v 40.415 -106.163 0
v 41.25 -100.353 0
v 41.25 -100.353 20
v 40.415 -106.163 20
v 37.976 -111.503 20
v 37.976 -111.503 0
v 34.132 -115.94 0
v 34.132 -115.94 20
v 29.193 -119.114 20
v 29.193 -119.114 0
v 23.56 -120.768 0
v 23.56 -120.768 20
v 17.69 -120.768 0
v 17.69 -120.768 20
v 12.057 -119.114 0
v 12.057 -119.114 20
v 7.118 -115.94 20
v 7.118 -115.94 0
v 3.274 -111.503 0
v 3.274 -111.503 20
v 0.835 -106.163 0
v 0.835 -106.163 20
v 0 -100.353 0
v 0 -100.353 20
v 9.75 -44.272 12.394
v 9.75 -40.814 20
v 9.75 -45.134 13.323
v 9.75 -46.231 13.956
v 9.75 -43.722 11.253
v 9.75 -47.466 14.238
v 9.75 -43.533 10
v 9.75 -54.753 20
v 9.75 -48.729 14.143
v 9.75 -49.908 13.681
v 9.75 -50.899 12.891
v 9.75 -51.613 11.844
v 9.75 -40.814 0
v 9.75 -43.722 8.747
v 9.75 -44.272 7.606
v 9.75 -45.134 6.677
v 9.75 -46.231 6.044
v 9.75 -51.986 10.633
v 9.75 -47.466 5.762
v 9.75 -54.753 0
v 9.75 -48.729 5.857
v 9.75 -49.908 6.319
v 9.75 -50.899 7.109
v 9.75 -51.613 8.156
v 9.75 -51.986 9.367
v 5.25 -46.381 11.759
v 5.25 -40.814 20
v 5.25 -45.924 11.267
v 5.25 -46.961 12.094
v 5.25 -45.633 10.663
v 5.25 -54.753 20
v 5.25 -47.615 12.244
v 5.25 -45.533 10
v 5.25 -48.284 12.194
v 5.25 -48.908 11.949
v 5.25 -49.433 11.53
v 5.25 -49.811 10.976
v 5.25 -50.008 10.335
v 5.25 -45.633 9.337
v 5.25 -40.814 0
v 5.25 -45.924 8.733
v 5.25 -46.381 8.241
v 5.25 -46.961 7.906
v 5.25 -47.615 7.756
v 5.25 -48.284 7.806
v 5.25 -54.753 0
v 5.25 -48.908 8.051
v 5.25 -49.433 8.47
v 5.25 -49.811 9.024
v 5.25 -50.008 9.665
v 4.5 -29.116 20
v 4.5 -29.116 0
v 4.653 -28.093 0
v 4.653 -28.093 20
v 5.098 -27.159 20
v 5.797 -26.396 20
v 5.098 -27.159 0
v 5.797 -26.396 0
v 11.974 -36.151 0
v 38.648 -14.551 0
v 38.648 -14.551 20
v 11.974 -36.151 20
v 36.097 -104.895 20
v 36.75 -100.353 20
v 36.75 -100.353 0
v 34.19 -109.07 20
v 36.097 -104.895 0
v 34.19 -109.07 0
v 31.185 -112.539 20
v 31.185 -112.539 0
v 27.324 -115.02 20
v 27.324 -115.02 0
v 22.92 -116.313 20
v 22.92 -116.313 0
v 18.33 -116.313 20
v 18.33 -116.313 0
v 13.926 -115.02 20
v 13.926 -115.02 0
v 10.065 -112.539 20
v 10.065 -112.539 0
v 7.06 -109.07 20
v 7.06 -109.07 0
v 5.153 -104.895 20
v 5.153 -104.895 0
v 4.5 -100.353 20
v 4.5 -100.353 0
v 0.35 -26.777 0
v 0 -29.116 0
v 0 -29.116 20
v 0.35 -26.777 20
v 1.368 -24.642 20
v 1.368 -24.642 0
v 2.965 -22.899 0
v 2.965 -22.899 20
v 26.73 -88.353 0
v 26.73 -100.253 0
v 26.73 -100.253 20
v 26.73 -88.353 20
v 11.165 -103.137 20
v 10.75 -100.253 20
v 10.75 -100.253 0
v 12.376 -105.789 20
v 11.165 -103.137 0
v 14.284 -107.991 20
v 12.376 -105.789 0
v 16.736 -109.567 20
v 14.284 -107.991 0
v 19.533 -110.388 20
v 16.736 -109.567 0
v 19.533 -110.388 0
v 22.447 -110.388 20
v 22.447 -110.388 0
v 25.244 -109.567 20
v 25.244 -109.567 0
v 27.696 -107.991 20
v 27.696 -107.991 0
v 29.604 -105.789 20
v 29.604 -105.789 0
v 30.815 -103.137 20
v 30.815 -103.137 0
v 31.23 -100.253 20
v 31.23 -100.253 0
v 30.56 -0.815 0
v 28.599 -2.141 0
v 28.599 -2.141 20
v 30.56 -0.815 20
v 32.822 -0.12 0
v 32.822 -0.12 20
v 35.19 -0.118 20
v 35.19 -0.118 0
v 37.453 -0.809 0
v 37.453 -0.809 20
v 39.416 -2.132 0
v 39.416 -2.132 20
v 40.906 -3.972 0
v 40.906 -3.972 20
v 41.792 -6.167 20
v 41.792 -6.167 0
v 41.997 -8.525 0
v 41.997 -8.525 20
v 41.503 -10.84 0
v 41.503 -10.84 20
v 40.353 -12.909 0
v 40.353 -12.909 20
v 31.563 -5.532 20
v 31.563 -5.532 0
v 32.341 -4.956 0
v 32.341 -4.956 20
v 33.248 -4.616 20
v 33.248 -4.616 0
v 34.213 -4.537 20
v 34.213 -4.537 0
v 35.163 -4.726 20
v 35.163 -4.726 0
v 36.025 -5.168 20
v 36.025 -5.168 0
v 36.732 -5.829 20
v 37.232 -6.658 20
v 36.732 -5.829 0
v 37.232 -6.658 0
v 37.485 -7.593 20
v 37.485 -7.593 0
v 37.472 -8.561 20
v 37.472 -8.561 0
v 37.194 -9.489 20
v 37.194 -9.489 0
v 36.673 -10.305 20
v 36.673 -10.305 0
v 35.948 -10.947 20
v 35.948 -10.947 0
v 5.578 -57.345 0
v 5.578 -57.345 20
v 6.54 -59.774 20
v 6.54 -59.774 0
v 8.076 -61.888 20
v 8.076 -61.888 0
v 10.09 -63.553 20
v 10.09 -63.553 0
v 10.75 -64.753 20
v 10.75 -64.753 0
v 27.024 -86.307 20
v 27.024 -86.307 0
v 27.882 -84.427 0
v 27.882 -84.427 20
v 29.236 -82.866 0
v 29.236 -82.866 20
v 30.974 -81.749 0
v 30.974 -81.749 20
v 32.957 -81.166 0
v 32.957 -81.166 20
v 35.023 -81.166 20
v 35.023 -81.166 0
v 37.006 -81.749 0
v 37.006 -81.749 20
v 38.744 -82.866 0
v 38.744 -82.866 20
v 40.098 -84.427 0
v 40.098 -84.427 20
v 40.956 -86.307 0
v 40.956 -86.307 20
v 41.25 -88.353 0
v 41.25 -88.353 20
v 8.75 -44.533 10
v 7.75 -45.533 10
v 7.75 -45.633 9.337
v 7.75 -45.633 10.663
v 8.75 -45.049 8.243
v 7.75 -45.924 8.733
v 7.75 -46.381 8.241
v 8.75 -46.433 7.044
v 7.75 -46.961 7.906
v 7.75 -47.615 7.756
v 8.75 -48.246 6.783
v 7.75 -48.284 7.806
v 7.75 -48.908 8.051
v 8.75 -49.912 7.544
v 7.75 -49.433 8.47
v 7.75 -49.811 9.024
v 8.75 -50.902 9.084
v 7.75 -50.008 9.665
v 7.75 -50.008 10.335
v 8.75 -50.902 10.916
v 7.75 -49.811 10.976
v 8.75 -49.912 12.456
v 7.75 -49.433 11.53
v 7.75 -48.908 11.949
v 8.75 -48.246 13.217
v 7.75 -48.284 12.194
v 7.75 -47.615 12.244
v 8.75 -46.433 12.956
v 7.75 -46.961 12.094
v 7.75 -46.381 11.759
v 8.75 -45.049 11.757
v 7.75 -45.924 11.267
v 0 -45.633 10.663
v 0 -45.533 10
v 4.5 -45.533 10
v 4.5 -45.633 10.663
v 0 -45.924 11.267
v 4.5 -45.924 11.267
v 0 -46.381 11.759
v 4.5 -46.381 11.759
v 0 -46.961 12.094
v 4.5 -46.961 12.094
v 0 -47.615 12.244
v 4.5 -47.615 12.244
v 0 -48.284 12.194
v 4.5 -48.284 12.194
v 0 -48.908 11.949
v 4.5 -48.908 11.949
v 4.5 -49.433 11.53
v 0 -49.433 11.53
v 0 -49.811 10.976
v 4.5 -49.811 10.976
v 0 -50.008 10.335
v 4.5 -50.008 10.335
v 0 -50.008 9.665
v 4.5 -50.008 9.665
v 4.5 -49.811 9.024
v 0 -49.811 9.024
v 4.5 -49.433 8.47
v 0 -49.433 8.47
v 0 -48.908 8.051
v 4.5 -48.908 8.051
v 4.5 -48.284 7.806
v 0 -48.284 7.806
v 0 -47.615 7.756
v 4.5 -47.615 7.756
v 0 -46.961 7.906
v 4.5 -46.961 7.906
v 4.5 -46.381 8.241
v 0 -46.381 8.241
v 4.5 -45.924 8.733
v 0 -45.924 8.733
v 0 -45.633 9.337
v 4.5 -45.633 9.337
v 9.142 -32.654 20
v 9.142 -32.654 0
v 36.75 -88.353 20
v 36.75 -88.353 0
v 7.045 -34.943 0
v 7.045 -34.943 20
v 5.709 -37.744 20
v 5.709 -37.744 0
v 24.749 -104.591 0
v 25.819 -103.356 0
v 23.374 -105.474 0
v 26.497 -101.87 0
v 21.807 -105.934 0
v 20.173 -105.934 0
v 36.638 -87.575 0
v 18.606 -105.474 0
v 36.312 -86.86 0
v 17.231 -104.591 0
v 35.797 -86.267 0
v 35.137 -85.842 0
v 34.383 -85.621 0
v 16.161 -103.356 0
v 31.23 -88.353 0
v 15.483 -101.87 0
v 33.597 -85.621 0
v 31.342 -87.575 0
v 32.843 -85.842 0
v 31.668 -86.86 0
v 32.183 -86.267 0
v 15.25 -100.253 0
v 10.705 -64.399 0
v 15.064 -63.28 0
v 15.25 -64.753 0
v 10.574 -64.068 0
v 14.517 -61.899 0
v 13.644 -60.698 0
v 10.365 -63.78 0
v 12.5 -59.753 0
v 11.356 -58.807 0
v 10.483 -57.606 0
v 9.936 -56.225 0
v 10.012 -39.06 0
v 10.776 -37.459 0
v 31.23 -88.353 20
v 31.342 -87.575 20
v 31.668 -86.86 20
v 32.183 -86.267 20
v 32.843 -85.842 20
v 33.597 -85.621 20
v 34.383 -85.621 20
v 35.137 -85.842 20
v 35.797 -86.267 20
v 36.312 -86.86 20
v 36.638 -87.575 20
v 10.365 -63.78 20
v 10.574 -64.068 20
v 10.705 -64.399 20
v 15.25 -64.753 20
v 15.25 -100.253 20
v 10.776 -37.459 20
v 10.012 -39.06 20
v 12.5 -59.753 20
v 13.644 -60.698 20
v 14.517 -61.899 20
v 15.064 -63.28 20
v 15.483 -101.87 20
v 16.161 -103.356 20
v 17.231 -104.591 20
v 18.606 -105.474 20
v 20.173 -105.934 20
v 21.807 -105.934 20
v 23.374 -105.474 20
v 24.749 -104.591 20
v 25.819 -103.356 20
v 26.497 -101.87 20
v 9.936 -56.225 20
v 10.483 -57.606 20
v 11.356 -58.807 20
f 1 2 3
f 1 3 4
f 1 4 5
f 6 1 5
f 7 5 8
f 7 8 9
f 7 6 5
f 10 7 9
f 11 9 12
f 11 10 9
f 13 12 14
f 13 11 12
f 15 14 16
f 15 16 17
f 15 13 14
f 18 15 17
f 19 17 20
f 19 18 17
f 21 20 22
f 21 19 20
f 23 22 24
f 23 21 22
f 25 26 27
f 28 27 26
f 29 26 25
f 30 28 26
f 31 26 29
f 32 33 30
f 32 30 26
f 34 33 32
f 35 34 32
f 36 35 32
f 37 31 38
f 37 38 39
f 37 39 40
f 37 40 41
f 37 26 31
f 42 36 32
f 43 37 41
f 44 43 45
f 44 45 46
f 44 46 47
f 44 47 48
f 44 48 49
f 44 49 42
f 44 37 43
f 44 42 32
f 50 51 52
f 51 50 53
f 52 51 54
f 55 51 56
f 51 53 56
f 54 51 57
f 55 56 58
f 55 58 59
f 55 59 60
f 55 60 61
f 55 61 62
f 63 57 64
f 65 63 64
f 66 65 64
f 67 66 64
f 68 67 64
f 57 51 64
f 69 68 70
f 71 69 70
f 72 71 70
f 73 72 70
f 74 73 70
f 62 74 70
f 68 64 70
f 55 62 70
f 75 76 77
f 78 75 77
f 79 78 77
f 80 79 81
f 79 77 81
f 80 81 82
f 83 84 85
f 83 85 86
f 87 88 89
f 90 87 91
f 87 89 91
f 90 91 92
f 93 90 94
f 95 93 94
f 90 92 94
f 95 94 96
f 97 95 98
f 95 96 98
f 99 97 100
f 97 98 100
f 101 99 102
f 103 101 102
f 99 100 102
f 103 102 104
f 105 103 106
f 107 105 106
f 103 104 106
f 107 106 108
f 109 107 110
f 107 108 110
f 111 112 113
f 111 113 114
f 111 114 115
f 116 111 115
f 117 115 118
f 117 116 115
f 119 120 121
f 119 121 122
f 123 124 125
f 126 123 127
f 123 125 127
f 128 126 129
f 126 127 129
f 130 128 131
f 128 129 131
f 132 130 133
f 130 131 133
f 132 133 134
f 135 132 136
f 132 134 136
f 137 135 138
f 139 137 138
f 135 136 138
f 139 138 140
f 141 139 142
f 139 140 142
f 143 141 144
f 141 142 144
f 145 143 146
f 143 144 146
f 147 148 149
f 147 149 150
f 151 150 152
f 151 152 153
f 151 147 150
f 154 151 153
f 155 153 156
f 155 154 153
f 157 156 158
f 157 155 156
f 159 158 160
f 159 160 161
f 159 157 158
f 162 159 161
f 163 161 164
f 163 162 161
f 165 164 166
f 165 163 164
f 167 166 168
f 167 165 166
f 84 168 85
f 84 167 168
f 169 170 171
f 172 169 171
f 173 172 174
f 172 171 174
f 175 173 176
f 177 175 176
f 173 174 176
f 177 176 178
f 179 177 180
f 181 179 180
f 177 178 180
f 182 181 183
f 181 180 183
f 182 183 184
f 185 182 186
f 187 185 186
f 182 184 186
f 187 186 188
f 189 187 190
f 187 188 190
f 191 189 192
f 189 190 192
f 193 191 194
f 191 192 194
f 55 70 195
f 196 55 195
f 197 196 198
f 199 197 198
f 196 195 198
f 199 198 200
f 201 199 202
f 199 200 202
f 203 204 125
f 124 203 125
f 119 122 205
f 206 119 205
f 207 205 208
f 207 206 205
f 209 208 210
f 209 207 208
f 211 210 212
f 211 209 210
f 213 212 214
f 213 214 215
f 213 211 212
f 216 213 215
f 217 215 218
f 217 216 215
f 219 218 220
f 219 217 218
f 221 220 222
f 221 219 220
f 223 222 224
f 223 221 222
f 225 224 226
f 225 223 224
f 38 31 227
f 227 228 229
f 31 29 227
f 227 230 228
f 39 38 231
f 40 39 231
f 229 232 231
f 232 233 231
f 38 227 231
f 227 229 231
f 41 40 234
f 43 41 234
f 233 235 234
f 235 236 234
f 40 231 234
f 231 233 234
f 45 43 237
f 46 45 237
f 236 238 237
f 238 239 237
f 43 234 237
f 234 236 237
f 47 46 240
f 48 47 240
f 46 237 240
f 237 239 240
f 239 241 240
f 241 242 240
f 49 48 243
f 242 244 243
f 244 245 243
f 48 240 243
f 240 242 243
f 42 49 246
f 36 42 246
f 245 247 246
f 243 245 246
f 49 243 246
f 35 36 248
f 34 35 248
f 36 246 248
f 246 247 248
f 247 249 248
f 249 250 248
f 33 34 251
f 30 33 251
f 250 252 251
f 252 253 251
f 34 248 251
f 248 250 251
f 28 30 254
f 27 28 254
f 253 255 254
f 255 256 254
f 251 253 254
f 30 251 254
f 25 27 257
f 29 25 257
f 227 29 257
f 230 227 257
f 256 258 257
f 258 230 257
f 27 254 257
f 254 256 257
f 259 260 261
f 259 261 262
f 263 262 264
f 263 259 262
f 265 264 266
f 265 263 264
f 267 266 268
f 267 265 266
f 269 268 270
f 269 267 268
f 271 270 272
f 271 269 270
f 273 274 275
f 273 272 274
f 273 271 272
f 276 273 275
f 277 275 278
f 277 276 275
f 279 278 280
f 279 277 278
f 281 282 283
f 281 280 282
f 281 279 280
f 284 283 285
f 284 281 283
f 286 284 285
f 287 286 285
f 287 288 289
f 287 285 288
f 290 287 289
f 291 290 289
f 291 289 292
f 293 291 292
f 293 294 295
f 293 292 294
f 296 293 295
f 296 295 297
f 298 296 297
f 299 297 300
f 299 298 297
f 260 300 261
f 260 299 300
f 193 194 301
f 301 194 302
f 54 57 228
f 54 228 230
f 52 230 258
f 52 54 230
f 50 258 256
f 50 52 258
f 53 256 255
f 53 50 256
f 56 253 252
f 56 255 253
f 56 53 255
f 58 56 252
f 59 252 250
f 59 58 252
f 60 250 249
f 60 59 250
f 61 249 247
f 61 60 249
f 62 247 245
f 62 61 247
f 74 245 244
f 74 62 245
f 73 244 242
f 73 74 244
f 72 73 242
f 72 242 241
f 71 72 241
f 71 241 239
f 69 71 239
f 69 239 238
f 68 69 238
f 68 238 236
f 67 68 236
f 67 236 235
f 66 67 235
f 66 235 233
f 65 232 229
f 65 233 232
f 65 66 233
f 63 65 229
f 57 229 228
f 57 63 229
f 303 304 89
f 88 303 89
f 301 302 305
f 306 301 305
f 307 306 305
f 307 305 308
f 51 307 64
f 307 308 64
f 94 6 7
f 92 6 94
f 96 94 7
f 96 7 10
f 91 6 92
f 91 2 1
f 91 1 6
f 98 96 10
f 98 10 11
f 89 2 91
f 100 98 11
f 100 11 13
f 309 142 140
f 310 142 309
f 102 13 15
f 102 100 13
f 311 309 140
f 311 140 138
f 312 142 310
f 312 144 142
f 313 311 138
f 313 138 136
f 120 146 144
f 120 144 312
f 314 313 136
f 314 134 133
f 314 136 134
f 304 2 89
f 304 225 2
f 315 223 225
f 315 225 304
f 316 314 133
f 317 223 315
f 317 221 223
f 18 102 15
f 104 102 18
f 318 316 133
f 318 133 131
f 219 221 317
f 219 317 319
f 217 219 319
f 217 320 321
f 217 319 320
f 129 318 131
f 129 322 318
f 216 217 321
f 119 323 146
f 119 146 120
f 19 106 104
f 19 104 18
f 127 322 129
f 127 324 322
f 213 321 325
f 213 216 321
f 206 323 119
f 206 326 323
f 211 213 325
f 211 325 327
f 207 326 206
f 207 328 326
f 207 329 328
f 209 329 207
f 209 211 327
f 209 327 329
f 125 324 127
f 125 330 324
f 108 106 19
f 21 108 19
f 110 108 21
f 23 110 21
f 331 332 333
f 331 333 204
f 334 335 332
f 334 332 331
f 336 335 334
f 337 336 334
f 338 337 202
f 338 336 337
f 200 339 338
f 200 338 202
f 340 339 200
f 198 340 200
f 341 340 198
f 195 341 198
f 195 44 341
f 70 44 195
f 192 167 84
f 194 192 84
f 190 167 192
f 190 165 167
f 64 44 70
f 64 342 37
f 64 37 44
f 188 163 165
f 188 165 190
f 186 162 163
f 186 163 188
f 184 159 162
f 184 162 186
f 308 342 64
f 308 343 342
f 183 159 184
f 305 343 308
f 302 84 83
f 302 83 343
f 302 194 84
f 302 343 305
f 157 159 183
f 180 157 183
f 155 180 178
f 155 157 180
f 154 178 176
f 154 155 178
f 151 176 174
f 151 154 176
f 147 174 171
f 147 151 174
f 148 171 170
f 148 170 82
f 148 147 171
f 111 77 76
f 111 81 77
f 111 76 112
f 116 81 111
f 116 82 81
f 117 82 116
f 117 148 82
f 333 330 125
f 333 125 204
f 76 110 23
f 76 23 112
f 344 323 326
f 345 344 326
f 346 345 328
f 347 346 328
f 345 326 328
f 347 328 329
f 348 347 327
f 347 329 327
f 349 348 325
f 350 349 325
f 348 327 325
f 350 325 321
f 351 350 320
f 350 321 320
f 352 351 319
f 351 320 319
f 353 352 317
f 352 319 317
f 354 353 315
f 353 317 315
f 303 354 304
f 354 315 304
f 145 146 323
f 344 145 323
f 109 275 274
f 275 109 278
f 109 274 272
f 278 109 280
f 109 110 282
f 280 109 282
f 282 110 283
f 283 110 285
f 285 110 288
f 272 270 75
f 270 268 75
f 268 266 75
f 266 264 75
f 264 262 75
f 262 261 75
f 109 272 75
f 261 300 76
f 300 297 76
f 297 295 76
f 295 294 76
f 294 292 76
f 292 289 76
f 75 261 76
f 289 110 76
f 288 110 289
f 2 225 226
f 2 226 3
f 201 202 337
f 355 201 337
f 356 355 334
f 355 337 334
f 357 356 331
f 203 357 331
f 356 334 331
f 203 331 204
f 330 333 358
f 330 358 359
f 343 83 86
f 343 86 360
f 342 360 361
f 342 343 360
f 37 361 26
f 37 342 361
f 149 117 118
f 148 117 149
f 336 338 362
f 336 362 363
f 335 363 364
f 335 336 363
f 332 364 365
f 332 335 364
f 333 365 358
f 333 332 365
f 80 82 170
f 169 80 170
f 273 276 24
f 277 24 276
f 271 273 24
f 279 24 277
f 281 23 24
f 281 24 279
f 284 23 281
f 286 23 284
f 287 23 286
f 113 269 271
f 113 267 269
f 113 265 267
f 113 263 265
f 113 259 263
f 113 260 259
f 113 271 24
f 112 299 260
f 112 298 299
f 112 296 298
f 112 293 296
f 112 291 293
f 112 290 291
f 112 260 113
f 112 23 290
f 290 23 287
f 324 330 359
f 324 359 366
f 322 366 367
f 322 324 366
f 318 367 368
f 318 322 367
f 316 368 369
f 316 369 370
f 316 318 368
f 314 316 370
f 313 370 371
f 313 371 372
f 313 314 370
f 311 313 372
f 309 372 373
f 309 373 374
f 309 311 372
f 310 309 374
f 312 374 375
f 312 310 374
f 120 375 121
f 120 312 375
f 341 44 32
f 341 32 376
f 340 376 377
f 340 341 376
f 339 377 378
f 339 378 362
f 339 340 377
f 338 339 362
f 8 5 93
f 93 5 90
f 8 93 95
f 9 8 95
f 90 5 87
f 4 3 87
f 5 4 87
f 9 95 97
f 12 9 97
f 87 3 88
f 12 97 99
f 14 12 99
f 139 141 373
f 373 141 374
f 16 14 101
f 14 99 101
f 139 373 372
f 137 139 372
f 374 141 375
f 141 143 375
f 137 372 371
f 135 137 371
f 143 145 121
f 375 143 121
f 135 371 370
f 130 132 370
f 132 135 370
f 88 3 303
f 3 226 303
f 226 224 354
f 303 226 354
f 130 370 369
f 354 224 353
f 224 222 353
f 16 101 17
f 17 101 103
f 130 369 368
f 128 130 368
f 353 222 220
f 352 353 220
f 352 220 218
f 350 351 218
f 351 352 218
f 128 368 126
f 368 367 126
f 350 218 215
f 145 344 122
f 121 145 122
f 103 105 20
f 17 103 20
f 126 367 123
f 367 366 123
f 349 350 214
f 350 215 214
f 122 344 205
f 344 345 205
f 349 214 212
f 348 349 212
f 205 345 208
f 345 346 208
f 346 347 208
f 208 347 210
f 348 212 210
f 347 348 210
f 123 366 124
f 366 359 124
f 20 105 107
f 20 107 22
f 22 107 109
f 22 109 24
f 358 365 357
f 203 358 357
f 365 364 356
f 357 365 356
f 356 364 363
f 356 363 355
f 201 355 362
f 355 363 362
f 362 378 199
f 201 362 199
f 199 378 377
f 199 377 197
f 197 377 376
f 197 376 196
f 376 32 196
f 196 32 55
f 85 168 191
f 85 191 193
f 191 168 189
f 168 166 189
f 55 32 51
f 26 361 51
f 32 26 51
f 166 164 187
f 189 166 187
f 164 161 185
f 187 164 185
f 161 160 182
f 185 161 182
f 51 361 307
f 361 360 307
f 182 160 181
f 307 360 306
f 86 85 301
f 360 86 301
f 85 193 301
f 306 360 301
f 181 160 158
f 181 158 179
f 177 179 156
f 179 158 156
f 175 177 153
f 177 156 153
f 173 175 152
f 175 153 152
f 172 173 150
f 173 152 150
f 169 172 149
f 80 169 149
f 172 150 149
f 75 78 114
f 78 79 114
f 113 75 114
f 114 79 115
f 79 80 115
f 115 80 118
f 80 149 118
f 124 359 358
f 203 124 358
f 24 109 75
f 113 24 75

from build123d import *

# Parameters (mm, degrees)
BOSS_EXTRU_1_DEPTH           = 20
ENL_V_MAT_EXTRU_1_DEPTH      = 127.792788454
ENL_V_MAT_EXTRU_1_DEPTH_BACK = 127.792788454
ESQUISSE4_R                  = 2.25
CHANFREIN1_SIZE              = 2


with BuildPart() as part:
    # Esquisse3 → Boss.-Extru.1 (new body)
    with BuildSketch(Plane.XY):
        with BuildLine():
            Line((0, -100.352508149), (0, -29.115804262))
            ThreePointArc((0, -29.115804262), (0.779317725, -25.671715487), (2.965436872, -22.89863657))
            Line((2.965436872, -22.89863657), (28.598971382, -2.141009609))
            ThreePointArc((28.598971382, -2.141009609), (40.22943243, -2.99679919), (38.648412133, -14.551035418))
            Line((38.648412133, -14.551035418), (11.974077654, -36.151485576))
            ThreePointArc((11.974077654, -36.151485576), (10.334488294, -38.231294764), (9.75, -40.814361345))
            Line((9.75, -40.814361345), (9.75, -54.752508149))
            ThreePointArc((9.75, -54.752508149), (10.482858086, -57.605686201), (12.5, -59.752508149))
            ThreePointArc((12.5, -59.752508149), (14.517141914, -61.899330096), (15.25, -64.752508149))
            Line((15.25, -64.752508149), (15.25, -100.252508149))
            ThreePointArc((15.25, -100.252508149), (20.99, -105.992508149), (26.73, -100.252508149))
            Line((26.73, -100.252508149), (26.73, -88.352508149))
            ThreePointArc((26.73, -88.352508149), (33.99, -81.092508149), (41.25, -88.352508149))
            Line((41.25, -88.352508149), (41.25, -100.352508149))
            ThreePointArc((41.25, -100.352508149), (20.625, -120.977508149), (0, -100.352508149))
        make_face()
        with BuildLine():
            Line((4.5, -100.352508149), (4.5, -29.115804262))
            ThreePointArc((4.5, -29.115804262), (4.840951505, -27.609015423), (5.797378631, -26.395793396))
            Line((5.797378631, -26.395793396), (31.562630973, -5.531503439))
            ThreePointArc((31.562630973, -5.531503439), (36.732275603, -5.82874095), (35.948188205, -10.947215595))
            Line((35.948188205, -10.947215595), (9.142135894, -32.654328749))
            ThreePointArc((9.142135894, -32.654328749), (6.272854514, -36.293994828), (5.25, -40.814361345))
            Line((5.25, -40.814361345), (5.25, -54.752508149))
            ThreePointArc((5.25, -54.752508149), (6.539886497, -59.774320575), (10.090211132, -63.552892026))
            ThreePointArc((10.090211132, -63.552892026), (10.574170325, -64.06796447), (10.75, -64.752508149))
            Line((10.75, -64.752508149), (10.75, -100.252508149))
            ThreePointArc((10.75, -100.252508149), (20.99, -110.492508149), (31.23, -100.252508149))
            Line((31.23, -100.252508149), (31.23, -88.352508149))
            ThreePointArc((31.23, -88.352508149), (33.99, -85.592508149), (36.75, -88.352508149))
            Line((36.75, -88.352508149), (36.75, -100.352508149))
            ThreePointArc((36.75, -100.352508149), (20.625, -116.477508149), (4.5, -100.352508149))
        make_face(mode=Mode.SUBTRACT)
    extrude(amount=BOSS_EXTRU_1_DEPTH)

    # Esquisse4 → Enlèv. mat.-Extru.1 (cut, two sides: drawn at the far end of the back side and taken through both)
    with BuildSketch(Plane(origin=(9.75, 0, 0), x_dir=(0, 0, -1), z_dir=(1, 0, 0)).offset(-ENL_V_MAT_EXTRU_1_DEPTH_BACK)):
        with Locations(Location((-10, -47.783434747, 0), (0, 0, 90))):
            Circle(ESQUISSE4_R)
    extrude(amount=ENL_V_MAT_EXTRU_1_DEPTH + ENL_V_MAT_EXTRU_1_DEPTH_BACK, mode=Mode.SUBTRACT)

    # Chanfrein1
    chanfrein1_edges = [part.edges().sort_by_distance(p)[0] for p in [
        (9.75, -50.033434747, 10),
    ]]
    chamfer(chanfrein1_edges, length=CHANFREIN1_SIZE)


solid = part.part
